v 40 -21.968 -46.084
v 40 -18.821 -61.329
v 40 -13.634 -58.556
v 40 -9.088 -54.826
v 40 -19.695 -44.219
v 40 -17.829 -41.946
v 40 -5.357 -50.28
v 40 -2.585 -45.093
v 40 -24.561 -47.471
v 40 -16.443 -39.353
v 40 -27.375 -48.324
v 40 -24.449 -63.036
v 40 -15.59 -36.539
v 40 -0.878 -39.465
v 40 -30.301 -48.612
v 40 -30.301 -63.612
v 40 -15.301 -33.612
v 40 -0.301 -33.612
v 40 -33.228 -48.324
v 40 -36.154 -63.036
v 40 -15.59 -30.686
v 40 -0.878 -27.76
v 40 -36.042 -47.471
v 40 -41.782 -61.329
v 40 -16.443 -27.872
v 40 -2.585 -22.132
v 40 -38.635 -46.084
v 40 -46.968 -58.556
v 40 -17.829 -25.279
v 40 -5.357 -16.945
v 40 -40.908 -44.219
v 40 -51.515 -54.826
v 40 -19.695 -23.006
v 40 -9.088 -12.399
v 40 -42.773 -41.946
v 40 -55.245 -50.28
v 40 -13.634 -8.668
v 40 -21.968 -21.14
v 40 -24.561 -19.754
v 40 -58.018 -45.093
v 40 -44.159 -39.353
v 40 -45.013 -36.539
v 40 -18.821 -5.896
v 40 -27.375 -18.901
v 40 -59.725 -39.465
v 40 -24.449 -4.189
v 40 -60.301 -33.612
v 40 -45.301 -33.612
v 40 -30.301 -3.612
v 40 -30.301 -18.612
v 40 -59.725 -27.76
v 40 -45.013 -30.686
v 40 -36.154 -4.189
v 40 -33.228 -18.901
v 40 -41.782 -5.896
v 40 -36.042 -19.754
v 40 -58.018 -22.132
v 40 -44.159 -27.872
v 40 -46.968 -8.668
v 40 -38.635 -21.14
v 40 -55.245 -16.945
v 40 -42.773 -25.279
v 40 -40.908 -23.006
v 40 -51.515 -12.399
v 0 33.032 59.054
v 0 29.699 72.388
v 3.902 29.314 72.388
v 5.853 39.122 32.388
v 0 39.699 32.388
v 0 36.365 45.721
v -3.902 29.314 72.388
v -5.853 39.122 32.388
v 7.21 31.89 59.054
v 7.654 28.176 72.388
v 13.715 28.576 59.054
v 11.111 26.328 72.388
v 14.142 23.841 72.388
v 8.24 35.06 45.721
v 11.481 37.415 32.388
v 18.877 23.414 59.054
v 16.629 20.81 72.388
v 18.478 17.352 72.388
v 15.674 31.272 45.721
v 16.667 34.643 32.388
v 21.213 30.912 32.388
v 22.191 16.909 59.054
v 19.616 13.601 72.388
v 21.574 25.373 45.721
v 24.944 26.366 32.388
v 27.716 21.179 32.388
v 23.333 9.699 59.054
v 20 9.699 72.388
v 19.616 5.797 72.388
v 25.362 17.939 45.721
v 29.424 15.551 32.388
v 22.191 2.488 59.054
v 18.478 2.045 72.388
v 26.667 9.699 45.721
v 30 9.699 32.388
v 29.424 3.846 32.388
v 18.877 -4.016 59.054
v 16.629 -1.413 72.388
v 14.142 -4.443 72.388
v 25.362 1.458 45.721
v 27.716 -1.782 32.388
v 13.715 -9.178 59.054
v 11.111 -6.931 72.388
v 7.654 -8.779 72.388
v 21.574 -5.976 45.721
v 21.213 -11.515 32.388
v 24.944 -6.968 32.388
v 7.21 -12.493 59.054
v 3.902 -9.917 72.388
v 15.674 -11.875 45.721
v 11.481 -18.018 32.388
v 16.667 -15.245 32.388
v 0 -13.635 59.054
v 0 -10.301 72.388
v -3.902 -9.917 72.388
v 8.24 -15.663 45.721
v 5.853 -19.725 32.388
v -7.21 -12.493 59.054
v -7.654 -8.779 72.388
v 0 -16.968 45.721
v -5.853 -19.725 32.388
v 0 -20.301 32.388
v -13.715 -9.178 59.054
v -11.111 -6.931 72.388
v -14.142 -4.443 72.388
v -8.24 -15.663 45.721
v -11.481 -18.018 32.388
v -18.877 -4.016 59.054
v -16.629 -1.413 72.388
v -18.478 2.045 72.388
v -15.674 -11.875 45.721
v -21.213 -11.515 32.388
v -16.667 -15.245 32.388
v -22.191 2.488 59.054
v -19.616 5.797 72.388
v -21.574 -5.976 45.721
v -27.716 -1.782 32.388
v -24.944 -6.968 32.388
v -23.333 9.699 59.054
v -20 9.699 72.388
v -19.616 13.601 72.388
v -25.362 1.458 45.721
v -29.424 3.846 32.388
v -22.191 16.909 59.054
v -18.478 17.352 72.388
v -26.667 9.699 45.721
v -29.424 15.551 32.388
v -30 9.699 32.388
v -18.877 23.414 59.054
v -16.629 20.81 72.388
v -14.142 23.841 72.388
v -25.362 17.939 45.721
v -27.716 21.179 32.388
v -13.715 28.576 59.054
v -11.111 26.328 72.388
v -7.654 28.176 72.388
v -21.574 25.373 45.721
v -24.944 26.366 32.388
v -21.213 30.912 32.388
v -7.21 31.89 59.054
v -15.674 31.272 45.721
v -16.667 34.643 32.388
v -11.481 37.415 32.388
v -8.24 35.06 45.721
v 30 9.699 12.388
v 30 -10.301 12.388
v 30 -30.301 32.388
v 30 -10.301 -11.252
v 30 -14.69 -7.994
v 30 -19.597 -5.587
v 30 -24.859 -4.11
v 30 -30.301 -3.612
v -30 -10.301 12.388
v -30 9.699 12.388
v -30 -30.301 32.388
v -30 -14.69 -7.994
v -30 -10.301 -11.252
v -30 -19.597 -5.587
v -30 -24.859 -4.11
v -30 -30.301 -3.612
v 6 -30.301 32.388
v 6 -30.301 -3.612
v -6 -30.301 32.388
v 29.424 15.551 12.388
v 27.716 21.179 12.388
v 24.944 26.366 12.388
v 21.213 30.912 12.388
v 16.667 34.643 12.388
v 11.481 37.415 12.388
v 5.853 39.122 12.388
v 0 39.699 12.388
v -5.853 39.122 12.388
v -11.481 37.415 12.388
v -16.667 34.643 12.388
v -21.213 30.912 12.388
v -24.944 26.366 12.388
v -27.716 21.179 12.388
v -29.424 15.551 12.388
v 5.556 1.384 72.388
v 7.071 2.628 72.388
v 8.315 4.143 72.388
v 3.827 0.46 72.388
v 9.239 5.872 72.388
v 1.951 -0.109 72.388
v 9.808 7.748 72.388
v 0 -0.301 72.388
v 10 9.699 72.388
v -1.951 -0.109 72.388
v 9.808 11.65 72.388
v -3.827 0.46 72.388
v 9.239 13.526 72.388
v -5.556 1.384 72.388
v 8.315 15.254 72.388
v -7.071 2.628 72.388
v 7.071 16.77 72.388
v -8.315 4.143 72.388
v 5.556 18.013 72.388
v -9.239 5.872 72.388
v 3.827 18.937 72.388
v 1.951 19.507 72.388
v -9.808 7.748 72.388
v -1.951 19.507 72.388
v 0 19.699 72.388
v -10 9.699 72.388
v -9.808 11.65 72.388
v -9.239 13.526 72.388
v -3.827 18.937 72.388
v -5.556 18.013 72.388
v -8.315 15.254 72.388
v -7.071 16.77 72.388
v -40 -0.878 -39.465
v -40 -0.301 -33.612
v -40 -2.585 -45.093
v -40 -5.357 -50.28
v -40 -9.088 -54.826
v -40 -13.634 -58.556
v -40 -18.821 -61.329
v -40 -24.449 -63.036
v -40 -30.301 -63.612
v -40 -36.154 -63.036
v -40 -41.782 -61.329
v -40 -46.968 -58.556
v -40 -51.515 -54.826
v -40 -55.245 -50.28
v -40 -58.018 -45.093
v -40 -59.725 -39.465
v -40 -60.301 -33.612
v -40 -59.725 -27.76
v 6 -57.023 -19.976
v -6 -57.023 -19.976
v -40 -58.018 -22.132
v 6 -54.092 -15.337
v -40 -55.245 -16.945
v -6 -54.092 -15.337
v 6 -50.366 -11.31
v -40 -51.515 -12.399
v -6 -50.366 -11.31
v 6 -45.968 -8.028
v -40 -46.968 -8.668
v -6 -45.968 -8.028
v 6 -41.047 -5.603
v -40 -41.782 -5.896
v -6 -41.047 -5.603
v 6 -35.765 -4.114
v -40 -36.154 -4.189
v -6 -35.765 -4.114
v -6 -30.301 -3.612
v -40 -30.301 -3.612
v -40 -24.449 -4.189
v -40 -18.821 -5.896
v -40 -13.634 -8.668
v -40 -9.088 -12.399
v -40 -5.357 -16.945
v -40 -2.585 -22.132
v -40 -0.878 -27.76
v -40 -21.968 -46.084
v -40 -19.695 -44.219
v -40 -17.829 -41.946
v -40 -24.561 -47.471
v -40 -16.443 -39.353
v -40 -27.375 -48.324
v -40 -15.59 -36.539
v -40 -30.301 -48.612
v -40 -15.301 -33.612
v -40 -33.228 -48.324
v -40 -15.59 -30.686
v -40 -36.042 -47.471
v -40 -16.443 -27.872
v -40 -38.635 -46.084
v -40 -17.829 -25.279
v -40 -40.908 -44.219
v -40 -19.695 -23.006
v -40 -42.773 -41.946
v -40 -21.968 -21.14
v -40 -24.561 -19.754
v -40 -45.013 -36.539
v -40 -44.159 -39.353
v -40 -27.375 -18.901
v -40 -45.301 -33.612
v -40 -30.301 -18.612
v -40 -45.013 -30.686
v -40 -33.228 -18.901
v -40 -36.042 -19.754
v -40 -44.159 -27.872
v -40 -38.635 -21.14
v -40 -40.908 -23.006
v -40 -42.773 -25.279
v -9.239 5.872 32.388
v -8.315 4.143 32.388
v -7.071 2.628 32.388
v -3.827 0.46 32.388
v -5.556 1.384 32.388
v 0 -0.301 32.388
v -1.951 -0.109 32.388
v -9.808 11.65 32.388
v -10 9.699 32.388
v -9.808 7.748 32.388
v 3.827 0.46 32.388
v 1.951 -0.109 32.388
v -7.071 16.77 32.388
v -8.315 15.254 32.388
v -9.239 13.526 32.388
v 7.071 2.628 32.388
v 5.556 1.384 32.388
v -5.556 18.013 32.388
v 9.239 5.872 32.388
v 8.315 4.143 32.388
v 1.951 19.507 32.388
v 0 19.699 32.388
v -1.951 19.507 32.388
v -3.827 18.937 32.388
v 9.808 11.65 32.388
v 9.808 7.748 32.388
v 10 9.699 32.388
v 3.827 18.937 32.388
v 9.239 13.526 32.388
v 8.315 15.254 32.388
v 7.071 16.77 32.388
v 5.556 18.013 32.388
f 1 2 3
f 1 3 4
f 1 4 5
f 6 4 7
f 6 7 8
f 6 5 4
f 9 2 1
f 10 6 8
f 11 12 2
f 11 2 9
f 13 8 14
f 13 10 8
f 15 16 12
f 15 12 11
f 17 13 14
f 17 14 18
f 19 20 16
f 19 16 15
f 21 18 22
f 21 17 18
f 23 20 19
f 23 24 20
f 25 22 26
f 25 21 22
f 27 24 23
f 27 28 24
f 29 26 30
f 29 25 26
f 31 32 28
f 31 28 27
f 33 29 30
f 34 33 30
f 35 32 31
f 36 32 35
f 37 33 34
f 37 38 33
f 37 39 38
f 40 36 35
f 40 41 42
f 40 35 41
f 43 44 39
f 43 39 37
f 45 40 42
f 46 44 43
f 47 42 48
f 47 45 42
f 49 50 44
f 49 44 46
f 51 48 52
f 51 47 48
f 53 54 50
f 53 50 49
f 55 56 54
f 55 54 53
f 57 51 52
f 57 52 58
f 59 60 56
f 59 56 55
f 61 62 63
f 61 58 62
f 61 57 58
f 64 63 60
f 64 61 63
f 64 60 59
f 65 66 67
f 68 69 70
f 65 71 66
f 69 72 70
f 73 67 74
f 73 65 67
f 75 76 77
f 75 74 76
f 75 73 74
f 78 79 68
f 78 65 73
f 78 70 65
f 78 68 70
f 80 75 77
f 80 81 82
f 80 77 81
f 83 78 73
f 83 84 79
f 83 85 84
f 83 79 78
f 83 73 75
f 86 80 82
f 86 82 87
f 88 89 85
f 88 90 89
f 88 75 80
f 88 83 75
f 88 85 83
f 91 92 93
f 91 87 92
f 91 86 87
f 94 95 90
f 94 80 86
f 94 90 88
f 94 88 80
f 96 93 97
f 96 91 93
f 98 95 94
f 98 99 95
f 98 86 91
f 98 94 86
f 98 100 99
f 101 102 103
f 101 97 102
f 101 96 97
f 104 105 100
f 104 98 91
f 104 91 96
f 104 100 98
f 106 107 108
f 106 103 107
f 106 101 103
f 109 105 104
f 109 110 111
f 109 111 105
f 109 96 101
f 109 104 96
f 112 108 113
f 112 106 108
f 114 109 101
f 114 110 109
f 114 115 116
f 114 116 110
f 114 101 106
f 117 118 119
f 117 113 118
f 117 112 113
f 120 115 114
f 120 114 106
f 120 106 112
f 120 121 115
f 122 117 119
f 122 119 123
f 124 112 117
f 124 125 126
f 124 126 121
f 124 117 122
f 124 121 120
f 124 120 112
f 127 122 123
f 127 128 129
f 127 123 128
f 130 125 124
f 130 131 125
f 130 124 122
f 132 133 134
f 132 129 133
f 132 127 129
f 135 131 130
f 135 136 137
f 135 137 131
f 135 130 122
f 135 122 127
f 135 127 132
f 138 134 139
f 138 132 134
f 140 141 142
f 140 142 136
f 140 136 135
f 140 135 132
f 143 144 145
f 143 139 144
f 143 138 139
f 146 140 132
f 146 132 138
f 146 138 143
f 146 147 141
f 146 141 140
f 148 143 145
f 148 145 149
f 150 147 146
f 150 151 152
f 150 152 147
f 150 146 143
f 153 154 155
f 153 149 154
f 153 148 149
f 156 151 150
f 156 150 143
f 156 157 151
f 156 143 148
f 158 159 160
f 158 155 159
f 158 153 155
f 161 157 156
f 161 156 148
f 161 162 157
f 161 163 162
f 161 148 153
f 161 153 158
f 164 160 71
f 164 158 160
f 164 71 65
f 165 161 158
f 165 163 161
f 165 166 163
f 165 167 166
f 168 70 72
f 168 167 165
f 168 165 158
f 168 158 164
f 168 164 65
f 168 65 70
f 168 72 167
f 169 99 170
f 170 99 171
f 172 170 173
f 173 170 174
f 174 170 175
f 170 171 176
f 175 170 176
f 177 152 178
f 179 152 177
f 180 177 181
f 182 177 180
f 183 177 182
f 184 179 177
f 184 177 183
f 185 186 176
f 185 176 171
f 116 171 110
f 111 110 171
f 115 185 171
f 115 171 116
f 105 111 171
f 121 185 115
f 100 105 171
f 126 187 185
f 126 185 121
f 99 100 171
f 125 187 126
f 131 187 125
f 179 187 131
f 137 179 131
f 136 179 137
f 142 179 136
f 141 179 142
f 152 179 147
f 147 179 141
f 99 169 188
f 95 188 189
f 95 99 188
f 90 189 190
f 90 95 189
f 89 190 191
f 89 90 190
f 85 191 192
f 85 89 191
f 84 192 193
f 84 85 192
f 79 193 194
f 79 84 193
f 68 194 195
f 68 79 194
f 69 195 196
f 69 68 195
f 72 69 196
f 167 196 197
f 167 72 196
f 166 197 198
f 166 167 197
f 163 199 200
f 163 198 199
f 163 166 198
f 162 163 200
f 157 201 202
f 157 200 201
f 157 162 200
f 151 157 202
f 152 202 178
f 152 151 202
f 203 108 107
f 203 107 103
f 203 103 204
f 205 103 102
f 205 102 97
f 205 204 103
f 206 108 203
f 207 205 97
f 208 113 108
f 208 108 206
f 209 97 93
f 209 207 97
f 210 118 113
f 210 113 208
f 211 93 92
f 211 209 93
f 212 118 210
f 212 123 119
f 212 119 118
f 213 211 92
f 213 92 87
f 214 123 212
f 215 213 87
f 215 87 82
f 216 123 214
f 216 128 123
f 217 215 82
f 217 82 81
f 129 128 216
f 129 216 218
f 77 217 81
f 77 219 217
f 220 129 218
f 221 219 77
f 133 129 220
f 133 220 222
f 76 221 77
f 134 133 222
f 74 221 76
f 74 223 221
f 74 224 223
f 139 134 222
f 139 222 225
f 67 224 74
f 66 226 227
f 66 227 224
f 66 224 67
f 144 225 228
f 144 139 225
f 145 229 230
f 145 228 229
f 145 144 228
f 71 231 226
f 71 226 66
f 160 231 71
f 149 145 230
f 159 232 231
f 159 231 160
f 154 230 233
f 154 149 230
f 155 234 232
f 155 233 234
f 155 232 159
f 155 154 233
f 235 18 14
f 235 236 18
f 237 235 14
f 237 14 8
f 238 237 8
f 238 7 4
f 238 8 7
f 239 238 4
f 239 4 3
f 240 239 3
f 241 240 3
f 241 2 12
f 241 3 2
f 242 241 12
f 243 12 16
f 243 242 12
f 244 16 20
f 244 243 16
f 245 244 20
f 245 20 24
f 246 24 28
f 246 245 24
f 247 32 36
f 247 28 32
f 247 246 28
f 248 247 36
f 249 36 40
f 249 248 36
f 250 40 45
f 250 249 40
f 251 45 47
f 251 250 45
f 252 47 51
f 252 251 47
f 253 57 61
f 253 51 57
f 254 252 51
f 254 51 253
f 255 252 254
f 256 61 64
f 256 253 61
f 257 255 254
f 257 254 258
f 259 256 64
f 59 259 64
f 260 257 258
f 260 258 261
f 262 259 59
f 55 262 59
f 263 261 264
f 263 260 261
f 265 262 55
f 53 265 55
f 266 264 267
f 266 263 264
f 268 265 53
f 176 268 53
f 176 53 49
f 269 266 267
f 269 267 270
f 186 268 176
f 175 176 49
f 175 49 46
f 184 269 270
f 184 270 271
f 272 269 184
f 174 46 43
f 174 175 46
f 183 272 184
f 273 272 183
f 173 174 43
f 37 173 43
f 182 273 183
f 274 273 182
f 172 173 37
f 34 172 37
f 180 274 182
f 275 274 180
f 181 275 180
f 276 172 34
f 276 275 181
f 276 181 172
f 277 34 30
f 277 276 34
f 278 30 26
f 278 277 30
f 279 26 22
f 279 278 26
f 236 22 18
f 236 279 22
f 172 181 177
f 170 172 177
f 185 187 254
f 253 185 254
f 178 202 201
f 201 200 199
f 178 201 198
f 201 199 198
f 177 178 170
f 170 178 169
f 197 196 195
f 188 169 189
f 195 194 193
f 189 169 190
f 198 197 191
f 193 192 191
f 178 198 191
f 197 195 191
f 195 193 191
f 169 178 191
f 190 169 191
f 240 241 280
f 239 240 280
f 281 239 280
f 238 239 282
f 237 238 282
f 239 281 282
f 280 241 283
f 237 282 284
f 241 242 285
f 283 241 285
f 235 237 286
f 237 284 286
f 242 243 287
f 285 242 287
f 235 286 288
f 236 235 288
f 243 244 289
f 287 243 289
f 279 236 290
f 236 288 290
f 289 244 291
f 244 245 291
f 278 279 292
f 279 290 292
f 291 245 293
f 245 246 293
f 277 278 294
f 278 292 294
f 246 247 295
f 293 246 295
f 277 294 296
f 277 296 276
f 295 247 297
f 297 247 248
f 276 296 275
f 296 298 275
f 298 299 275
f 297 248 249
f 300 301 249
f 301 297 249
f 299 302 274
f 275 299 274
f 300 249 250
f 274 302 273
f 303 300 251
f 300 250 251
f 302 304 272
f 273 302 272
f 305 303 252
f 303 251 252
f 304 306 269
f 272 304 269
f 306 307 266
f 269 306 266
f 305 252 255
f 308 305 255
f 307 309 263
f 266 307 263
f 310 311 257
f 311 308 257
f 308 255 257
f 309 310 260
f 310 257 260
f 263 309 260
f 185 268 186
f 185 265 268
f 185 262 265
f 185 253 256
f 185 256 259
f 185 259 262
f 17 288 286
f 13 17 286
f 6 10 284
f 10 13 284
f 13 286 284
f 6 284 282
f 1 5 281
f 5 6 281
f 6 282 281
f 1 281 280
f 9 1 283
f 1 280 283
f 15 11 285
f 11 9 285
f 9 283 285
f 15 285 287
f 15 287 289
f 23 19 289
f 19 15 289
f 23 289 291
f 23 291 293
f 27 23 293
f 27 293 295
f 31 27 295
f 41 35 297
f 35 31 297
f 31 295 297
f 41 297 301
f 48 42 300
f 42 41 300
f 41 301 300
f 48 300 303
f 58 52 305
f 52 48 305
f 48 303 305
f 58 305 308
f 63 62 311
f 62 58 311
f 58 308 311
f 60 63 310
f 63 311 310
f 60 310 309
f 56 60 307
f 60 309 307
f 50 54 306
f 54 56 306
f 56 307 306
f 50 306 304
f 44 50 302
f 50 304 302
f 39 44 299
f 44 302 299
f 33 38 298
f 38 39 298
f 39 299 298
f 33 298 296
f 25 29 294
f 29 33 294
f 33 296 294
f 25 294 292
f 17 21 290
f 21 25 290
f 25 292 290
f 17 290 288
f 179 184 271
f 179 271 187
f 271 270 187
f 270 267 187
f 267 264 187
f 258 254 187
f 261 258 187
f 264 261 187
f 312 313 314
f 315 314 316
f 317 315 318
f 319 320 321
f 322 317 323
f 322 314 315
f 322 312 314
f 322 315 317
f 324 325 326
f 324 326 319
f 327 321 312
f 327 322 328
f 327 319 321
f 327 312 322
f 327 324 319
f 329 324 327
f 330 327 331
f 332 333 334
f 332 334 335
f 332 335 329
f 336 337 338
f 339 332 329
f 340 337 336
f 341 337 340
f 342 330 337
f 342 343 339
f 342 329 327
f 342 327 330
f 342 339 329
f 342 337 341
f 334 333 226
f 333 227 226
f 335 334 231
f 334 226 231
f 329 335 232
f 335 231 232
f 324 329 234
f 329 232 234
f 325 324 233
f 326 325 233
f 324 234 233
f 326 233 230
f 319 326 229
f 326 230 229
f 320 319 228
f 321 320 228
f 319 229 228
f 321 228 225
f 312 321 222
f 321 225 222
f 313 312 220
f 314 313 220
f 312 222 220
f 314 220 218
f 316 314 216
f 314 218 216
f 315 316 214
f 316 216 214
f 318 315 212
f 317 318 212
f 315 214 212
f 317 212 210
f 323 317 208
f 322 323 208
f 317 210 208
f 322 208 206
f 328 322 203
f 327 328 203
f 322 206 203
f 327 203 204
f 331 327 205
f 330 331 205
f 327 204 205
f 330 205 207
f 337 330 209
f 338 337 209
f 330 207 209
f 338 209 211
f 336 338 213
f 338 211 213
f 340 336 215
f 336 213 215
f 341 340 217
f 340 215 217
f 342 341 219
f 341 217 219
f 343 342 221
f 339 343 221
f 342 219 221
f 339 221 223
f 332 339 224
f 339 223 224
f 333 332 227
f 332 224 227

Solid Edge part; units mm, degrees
sketch "Sketch1" plane through (0, 0, 0) normal (1, 0, 0) x (0, 1, 0)
  circle A0 centre (-30.3013, -33.6124) radius 15
  circle A1 centre (-30.3013, -33.6124) radius 30
extrude "Protrusion1" add sketch "Sketch1" along normal mid plane 80
sketch "Sketch2" plane through (0, 0, 0) normal (1, 0, 0) x (0, 1, 0)
  line L0 (-30.3013, 32.3876) -> (-57.023, -19.976)
  arc A0 (-30.3013, -3.6124) -> (-57.023, -19.976) centre (-30.3013, -33.6124) ccw
  line L1 (-30.3013, -3.6124) -> (-30.3013, 32.3876)
extrude "ExtrudedProtrusion_2" add sketch "Sketch2" along normal mid plane 12
sketch "Sketch3" plane through (0, 0, 0) normal (1, 0, 0) x (0, 1, 0)
  line L0 (-30.3013, 32.3876) -> (-10.3013, 32.3876)
  line L1 (-10.3013, 32.3876) -> (-10.3013, 12.3876)
  line L2 (-10.3013, -11.2517) -> (-10.3013, 12.3876)
  arc A0 (-30.3013, -3.6124) -> (-10.3013, -11.2517) centre (-30.3013, -33.6124) cw
  line L3 (-30.3013, -3.6124) -> (-30.3013, 32.3876)
extrude "ExtrudedProtrusion_3" add sketch "Sketch3" along normal mid plane 60
sketch "Sketch4" plane through (0, -20.3013, 32.3876) normal (0, 0, 1) x (0, 1, 0)
  line L0 (-10, 30) -> (-10, -30)
  line L1 (-10, -30) -> (30, -30)
  arc A0 (30, 30) -> (30, -30) centre (30, 0) cw
  line L2 (-10, 30) -> (30, 30)
extrude "ExtrudedProtrusion_5" add sketch "Sketch4" against normal blind 20
sketch "Sketch5" plane through (0, 0, 0) normal (1, 0, 0) x (0, 1, 0)
  line L0 (9.6987, 32.3876) -> (9.6987, 72.3876)
  line L1 (9.6987, 72.3876) -> (29.6987, 72.3876)
  line L2 (29.6987, 72.3876) -> (39.6987, 32.3876)
  line L3 (39.6987, 32.3876) -> (9.6987, 32.3876)
revolve "RevolvedProtrusion1" add sketch "Sketch5" angle 360 about axis through (0, 9.6987, 32.3876) along (0, 0, 1)
sketch "Sketch6" plane through (0, 9.6987, 72.3876) normal (0, 0, 1) x (0, 1, 0)
  circle A0 centre (0, 0) radius 10
extrude "ExtrudedCutout_1" cut sketch "Sketch6" against normal blind 40
